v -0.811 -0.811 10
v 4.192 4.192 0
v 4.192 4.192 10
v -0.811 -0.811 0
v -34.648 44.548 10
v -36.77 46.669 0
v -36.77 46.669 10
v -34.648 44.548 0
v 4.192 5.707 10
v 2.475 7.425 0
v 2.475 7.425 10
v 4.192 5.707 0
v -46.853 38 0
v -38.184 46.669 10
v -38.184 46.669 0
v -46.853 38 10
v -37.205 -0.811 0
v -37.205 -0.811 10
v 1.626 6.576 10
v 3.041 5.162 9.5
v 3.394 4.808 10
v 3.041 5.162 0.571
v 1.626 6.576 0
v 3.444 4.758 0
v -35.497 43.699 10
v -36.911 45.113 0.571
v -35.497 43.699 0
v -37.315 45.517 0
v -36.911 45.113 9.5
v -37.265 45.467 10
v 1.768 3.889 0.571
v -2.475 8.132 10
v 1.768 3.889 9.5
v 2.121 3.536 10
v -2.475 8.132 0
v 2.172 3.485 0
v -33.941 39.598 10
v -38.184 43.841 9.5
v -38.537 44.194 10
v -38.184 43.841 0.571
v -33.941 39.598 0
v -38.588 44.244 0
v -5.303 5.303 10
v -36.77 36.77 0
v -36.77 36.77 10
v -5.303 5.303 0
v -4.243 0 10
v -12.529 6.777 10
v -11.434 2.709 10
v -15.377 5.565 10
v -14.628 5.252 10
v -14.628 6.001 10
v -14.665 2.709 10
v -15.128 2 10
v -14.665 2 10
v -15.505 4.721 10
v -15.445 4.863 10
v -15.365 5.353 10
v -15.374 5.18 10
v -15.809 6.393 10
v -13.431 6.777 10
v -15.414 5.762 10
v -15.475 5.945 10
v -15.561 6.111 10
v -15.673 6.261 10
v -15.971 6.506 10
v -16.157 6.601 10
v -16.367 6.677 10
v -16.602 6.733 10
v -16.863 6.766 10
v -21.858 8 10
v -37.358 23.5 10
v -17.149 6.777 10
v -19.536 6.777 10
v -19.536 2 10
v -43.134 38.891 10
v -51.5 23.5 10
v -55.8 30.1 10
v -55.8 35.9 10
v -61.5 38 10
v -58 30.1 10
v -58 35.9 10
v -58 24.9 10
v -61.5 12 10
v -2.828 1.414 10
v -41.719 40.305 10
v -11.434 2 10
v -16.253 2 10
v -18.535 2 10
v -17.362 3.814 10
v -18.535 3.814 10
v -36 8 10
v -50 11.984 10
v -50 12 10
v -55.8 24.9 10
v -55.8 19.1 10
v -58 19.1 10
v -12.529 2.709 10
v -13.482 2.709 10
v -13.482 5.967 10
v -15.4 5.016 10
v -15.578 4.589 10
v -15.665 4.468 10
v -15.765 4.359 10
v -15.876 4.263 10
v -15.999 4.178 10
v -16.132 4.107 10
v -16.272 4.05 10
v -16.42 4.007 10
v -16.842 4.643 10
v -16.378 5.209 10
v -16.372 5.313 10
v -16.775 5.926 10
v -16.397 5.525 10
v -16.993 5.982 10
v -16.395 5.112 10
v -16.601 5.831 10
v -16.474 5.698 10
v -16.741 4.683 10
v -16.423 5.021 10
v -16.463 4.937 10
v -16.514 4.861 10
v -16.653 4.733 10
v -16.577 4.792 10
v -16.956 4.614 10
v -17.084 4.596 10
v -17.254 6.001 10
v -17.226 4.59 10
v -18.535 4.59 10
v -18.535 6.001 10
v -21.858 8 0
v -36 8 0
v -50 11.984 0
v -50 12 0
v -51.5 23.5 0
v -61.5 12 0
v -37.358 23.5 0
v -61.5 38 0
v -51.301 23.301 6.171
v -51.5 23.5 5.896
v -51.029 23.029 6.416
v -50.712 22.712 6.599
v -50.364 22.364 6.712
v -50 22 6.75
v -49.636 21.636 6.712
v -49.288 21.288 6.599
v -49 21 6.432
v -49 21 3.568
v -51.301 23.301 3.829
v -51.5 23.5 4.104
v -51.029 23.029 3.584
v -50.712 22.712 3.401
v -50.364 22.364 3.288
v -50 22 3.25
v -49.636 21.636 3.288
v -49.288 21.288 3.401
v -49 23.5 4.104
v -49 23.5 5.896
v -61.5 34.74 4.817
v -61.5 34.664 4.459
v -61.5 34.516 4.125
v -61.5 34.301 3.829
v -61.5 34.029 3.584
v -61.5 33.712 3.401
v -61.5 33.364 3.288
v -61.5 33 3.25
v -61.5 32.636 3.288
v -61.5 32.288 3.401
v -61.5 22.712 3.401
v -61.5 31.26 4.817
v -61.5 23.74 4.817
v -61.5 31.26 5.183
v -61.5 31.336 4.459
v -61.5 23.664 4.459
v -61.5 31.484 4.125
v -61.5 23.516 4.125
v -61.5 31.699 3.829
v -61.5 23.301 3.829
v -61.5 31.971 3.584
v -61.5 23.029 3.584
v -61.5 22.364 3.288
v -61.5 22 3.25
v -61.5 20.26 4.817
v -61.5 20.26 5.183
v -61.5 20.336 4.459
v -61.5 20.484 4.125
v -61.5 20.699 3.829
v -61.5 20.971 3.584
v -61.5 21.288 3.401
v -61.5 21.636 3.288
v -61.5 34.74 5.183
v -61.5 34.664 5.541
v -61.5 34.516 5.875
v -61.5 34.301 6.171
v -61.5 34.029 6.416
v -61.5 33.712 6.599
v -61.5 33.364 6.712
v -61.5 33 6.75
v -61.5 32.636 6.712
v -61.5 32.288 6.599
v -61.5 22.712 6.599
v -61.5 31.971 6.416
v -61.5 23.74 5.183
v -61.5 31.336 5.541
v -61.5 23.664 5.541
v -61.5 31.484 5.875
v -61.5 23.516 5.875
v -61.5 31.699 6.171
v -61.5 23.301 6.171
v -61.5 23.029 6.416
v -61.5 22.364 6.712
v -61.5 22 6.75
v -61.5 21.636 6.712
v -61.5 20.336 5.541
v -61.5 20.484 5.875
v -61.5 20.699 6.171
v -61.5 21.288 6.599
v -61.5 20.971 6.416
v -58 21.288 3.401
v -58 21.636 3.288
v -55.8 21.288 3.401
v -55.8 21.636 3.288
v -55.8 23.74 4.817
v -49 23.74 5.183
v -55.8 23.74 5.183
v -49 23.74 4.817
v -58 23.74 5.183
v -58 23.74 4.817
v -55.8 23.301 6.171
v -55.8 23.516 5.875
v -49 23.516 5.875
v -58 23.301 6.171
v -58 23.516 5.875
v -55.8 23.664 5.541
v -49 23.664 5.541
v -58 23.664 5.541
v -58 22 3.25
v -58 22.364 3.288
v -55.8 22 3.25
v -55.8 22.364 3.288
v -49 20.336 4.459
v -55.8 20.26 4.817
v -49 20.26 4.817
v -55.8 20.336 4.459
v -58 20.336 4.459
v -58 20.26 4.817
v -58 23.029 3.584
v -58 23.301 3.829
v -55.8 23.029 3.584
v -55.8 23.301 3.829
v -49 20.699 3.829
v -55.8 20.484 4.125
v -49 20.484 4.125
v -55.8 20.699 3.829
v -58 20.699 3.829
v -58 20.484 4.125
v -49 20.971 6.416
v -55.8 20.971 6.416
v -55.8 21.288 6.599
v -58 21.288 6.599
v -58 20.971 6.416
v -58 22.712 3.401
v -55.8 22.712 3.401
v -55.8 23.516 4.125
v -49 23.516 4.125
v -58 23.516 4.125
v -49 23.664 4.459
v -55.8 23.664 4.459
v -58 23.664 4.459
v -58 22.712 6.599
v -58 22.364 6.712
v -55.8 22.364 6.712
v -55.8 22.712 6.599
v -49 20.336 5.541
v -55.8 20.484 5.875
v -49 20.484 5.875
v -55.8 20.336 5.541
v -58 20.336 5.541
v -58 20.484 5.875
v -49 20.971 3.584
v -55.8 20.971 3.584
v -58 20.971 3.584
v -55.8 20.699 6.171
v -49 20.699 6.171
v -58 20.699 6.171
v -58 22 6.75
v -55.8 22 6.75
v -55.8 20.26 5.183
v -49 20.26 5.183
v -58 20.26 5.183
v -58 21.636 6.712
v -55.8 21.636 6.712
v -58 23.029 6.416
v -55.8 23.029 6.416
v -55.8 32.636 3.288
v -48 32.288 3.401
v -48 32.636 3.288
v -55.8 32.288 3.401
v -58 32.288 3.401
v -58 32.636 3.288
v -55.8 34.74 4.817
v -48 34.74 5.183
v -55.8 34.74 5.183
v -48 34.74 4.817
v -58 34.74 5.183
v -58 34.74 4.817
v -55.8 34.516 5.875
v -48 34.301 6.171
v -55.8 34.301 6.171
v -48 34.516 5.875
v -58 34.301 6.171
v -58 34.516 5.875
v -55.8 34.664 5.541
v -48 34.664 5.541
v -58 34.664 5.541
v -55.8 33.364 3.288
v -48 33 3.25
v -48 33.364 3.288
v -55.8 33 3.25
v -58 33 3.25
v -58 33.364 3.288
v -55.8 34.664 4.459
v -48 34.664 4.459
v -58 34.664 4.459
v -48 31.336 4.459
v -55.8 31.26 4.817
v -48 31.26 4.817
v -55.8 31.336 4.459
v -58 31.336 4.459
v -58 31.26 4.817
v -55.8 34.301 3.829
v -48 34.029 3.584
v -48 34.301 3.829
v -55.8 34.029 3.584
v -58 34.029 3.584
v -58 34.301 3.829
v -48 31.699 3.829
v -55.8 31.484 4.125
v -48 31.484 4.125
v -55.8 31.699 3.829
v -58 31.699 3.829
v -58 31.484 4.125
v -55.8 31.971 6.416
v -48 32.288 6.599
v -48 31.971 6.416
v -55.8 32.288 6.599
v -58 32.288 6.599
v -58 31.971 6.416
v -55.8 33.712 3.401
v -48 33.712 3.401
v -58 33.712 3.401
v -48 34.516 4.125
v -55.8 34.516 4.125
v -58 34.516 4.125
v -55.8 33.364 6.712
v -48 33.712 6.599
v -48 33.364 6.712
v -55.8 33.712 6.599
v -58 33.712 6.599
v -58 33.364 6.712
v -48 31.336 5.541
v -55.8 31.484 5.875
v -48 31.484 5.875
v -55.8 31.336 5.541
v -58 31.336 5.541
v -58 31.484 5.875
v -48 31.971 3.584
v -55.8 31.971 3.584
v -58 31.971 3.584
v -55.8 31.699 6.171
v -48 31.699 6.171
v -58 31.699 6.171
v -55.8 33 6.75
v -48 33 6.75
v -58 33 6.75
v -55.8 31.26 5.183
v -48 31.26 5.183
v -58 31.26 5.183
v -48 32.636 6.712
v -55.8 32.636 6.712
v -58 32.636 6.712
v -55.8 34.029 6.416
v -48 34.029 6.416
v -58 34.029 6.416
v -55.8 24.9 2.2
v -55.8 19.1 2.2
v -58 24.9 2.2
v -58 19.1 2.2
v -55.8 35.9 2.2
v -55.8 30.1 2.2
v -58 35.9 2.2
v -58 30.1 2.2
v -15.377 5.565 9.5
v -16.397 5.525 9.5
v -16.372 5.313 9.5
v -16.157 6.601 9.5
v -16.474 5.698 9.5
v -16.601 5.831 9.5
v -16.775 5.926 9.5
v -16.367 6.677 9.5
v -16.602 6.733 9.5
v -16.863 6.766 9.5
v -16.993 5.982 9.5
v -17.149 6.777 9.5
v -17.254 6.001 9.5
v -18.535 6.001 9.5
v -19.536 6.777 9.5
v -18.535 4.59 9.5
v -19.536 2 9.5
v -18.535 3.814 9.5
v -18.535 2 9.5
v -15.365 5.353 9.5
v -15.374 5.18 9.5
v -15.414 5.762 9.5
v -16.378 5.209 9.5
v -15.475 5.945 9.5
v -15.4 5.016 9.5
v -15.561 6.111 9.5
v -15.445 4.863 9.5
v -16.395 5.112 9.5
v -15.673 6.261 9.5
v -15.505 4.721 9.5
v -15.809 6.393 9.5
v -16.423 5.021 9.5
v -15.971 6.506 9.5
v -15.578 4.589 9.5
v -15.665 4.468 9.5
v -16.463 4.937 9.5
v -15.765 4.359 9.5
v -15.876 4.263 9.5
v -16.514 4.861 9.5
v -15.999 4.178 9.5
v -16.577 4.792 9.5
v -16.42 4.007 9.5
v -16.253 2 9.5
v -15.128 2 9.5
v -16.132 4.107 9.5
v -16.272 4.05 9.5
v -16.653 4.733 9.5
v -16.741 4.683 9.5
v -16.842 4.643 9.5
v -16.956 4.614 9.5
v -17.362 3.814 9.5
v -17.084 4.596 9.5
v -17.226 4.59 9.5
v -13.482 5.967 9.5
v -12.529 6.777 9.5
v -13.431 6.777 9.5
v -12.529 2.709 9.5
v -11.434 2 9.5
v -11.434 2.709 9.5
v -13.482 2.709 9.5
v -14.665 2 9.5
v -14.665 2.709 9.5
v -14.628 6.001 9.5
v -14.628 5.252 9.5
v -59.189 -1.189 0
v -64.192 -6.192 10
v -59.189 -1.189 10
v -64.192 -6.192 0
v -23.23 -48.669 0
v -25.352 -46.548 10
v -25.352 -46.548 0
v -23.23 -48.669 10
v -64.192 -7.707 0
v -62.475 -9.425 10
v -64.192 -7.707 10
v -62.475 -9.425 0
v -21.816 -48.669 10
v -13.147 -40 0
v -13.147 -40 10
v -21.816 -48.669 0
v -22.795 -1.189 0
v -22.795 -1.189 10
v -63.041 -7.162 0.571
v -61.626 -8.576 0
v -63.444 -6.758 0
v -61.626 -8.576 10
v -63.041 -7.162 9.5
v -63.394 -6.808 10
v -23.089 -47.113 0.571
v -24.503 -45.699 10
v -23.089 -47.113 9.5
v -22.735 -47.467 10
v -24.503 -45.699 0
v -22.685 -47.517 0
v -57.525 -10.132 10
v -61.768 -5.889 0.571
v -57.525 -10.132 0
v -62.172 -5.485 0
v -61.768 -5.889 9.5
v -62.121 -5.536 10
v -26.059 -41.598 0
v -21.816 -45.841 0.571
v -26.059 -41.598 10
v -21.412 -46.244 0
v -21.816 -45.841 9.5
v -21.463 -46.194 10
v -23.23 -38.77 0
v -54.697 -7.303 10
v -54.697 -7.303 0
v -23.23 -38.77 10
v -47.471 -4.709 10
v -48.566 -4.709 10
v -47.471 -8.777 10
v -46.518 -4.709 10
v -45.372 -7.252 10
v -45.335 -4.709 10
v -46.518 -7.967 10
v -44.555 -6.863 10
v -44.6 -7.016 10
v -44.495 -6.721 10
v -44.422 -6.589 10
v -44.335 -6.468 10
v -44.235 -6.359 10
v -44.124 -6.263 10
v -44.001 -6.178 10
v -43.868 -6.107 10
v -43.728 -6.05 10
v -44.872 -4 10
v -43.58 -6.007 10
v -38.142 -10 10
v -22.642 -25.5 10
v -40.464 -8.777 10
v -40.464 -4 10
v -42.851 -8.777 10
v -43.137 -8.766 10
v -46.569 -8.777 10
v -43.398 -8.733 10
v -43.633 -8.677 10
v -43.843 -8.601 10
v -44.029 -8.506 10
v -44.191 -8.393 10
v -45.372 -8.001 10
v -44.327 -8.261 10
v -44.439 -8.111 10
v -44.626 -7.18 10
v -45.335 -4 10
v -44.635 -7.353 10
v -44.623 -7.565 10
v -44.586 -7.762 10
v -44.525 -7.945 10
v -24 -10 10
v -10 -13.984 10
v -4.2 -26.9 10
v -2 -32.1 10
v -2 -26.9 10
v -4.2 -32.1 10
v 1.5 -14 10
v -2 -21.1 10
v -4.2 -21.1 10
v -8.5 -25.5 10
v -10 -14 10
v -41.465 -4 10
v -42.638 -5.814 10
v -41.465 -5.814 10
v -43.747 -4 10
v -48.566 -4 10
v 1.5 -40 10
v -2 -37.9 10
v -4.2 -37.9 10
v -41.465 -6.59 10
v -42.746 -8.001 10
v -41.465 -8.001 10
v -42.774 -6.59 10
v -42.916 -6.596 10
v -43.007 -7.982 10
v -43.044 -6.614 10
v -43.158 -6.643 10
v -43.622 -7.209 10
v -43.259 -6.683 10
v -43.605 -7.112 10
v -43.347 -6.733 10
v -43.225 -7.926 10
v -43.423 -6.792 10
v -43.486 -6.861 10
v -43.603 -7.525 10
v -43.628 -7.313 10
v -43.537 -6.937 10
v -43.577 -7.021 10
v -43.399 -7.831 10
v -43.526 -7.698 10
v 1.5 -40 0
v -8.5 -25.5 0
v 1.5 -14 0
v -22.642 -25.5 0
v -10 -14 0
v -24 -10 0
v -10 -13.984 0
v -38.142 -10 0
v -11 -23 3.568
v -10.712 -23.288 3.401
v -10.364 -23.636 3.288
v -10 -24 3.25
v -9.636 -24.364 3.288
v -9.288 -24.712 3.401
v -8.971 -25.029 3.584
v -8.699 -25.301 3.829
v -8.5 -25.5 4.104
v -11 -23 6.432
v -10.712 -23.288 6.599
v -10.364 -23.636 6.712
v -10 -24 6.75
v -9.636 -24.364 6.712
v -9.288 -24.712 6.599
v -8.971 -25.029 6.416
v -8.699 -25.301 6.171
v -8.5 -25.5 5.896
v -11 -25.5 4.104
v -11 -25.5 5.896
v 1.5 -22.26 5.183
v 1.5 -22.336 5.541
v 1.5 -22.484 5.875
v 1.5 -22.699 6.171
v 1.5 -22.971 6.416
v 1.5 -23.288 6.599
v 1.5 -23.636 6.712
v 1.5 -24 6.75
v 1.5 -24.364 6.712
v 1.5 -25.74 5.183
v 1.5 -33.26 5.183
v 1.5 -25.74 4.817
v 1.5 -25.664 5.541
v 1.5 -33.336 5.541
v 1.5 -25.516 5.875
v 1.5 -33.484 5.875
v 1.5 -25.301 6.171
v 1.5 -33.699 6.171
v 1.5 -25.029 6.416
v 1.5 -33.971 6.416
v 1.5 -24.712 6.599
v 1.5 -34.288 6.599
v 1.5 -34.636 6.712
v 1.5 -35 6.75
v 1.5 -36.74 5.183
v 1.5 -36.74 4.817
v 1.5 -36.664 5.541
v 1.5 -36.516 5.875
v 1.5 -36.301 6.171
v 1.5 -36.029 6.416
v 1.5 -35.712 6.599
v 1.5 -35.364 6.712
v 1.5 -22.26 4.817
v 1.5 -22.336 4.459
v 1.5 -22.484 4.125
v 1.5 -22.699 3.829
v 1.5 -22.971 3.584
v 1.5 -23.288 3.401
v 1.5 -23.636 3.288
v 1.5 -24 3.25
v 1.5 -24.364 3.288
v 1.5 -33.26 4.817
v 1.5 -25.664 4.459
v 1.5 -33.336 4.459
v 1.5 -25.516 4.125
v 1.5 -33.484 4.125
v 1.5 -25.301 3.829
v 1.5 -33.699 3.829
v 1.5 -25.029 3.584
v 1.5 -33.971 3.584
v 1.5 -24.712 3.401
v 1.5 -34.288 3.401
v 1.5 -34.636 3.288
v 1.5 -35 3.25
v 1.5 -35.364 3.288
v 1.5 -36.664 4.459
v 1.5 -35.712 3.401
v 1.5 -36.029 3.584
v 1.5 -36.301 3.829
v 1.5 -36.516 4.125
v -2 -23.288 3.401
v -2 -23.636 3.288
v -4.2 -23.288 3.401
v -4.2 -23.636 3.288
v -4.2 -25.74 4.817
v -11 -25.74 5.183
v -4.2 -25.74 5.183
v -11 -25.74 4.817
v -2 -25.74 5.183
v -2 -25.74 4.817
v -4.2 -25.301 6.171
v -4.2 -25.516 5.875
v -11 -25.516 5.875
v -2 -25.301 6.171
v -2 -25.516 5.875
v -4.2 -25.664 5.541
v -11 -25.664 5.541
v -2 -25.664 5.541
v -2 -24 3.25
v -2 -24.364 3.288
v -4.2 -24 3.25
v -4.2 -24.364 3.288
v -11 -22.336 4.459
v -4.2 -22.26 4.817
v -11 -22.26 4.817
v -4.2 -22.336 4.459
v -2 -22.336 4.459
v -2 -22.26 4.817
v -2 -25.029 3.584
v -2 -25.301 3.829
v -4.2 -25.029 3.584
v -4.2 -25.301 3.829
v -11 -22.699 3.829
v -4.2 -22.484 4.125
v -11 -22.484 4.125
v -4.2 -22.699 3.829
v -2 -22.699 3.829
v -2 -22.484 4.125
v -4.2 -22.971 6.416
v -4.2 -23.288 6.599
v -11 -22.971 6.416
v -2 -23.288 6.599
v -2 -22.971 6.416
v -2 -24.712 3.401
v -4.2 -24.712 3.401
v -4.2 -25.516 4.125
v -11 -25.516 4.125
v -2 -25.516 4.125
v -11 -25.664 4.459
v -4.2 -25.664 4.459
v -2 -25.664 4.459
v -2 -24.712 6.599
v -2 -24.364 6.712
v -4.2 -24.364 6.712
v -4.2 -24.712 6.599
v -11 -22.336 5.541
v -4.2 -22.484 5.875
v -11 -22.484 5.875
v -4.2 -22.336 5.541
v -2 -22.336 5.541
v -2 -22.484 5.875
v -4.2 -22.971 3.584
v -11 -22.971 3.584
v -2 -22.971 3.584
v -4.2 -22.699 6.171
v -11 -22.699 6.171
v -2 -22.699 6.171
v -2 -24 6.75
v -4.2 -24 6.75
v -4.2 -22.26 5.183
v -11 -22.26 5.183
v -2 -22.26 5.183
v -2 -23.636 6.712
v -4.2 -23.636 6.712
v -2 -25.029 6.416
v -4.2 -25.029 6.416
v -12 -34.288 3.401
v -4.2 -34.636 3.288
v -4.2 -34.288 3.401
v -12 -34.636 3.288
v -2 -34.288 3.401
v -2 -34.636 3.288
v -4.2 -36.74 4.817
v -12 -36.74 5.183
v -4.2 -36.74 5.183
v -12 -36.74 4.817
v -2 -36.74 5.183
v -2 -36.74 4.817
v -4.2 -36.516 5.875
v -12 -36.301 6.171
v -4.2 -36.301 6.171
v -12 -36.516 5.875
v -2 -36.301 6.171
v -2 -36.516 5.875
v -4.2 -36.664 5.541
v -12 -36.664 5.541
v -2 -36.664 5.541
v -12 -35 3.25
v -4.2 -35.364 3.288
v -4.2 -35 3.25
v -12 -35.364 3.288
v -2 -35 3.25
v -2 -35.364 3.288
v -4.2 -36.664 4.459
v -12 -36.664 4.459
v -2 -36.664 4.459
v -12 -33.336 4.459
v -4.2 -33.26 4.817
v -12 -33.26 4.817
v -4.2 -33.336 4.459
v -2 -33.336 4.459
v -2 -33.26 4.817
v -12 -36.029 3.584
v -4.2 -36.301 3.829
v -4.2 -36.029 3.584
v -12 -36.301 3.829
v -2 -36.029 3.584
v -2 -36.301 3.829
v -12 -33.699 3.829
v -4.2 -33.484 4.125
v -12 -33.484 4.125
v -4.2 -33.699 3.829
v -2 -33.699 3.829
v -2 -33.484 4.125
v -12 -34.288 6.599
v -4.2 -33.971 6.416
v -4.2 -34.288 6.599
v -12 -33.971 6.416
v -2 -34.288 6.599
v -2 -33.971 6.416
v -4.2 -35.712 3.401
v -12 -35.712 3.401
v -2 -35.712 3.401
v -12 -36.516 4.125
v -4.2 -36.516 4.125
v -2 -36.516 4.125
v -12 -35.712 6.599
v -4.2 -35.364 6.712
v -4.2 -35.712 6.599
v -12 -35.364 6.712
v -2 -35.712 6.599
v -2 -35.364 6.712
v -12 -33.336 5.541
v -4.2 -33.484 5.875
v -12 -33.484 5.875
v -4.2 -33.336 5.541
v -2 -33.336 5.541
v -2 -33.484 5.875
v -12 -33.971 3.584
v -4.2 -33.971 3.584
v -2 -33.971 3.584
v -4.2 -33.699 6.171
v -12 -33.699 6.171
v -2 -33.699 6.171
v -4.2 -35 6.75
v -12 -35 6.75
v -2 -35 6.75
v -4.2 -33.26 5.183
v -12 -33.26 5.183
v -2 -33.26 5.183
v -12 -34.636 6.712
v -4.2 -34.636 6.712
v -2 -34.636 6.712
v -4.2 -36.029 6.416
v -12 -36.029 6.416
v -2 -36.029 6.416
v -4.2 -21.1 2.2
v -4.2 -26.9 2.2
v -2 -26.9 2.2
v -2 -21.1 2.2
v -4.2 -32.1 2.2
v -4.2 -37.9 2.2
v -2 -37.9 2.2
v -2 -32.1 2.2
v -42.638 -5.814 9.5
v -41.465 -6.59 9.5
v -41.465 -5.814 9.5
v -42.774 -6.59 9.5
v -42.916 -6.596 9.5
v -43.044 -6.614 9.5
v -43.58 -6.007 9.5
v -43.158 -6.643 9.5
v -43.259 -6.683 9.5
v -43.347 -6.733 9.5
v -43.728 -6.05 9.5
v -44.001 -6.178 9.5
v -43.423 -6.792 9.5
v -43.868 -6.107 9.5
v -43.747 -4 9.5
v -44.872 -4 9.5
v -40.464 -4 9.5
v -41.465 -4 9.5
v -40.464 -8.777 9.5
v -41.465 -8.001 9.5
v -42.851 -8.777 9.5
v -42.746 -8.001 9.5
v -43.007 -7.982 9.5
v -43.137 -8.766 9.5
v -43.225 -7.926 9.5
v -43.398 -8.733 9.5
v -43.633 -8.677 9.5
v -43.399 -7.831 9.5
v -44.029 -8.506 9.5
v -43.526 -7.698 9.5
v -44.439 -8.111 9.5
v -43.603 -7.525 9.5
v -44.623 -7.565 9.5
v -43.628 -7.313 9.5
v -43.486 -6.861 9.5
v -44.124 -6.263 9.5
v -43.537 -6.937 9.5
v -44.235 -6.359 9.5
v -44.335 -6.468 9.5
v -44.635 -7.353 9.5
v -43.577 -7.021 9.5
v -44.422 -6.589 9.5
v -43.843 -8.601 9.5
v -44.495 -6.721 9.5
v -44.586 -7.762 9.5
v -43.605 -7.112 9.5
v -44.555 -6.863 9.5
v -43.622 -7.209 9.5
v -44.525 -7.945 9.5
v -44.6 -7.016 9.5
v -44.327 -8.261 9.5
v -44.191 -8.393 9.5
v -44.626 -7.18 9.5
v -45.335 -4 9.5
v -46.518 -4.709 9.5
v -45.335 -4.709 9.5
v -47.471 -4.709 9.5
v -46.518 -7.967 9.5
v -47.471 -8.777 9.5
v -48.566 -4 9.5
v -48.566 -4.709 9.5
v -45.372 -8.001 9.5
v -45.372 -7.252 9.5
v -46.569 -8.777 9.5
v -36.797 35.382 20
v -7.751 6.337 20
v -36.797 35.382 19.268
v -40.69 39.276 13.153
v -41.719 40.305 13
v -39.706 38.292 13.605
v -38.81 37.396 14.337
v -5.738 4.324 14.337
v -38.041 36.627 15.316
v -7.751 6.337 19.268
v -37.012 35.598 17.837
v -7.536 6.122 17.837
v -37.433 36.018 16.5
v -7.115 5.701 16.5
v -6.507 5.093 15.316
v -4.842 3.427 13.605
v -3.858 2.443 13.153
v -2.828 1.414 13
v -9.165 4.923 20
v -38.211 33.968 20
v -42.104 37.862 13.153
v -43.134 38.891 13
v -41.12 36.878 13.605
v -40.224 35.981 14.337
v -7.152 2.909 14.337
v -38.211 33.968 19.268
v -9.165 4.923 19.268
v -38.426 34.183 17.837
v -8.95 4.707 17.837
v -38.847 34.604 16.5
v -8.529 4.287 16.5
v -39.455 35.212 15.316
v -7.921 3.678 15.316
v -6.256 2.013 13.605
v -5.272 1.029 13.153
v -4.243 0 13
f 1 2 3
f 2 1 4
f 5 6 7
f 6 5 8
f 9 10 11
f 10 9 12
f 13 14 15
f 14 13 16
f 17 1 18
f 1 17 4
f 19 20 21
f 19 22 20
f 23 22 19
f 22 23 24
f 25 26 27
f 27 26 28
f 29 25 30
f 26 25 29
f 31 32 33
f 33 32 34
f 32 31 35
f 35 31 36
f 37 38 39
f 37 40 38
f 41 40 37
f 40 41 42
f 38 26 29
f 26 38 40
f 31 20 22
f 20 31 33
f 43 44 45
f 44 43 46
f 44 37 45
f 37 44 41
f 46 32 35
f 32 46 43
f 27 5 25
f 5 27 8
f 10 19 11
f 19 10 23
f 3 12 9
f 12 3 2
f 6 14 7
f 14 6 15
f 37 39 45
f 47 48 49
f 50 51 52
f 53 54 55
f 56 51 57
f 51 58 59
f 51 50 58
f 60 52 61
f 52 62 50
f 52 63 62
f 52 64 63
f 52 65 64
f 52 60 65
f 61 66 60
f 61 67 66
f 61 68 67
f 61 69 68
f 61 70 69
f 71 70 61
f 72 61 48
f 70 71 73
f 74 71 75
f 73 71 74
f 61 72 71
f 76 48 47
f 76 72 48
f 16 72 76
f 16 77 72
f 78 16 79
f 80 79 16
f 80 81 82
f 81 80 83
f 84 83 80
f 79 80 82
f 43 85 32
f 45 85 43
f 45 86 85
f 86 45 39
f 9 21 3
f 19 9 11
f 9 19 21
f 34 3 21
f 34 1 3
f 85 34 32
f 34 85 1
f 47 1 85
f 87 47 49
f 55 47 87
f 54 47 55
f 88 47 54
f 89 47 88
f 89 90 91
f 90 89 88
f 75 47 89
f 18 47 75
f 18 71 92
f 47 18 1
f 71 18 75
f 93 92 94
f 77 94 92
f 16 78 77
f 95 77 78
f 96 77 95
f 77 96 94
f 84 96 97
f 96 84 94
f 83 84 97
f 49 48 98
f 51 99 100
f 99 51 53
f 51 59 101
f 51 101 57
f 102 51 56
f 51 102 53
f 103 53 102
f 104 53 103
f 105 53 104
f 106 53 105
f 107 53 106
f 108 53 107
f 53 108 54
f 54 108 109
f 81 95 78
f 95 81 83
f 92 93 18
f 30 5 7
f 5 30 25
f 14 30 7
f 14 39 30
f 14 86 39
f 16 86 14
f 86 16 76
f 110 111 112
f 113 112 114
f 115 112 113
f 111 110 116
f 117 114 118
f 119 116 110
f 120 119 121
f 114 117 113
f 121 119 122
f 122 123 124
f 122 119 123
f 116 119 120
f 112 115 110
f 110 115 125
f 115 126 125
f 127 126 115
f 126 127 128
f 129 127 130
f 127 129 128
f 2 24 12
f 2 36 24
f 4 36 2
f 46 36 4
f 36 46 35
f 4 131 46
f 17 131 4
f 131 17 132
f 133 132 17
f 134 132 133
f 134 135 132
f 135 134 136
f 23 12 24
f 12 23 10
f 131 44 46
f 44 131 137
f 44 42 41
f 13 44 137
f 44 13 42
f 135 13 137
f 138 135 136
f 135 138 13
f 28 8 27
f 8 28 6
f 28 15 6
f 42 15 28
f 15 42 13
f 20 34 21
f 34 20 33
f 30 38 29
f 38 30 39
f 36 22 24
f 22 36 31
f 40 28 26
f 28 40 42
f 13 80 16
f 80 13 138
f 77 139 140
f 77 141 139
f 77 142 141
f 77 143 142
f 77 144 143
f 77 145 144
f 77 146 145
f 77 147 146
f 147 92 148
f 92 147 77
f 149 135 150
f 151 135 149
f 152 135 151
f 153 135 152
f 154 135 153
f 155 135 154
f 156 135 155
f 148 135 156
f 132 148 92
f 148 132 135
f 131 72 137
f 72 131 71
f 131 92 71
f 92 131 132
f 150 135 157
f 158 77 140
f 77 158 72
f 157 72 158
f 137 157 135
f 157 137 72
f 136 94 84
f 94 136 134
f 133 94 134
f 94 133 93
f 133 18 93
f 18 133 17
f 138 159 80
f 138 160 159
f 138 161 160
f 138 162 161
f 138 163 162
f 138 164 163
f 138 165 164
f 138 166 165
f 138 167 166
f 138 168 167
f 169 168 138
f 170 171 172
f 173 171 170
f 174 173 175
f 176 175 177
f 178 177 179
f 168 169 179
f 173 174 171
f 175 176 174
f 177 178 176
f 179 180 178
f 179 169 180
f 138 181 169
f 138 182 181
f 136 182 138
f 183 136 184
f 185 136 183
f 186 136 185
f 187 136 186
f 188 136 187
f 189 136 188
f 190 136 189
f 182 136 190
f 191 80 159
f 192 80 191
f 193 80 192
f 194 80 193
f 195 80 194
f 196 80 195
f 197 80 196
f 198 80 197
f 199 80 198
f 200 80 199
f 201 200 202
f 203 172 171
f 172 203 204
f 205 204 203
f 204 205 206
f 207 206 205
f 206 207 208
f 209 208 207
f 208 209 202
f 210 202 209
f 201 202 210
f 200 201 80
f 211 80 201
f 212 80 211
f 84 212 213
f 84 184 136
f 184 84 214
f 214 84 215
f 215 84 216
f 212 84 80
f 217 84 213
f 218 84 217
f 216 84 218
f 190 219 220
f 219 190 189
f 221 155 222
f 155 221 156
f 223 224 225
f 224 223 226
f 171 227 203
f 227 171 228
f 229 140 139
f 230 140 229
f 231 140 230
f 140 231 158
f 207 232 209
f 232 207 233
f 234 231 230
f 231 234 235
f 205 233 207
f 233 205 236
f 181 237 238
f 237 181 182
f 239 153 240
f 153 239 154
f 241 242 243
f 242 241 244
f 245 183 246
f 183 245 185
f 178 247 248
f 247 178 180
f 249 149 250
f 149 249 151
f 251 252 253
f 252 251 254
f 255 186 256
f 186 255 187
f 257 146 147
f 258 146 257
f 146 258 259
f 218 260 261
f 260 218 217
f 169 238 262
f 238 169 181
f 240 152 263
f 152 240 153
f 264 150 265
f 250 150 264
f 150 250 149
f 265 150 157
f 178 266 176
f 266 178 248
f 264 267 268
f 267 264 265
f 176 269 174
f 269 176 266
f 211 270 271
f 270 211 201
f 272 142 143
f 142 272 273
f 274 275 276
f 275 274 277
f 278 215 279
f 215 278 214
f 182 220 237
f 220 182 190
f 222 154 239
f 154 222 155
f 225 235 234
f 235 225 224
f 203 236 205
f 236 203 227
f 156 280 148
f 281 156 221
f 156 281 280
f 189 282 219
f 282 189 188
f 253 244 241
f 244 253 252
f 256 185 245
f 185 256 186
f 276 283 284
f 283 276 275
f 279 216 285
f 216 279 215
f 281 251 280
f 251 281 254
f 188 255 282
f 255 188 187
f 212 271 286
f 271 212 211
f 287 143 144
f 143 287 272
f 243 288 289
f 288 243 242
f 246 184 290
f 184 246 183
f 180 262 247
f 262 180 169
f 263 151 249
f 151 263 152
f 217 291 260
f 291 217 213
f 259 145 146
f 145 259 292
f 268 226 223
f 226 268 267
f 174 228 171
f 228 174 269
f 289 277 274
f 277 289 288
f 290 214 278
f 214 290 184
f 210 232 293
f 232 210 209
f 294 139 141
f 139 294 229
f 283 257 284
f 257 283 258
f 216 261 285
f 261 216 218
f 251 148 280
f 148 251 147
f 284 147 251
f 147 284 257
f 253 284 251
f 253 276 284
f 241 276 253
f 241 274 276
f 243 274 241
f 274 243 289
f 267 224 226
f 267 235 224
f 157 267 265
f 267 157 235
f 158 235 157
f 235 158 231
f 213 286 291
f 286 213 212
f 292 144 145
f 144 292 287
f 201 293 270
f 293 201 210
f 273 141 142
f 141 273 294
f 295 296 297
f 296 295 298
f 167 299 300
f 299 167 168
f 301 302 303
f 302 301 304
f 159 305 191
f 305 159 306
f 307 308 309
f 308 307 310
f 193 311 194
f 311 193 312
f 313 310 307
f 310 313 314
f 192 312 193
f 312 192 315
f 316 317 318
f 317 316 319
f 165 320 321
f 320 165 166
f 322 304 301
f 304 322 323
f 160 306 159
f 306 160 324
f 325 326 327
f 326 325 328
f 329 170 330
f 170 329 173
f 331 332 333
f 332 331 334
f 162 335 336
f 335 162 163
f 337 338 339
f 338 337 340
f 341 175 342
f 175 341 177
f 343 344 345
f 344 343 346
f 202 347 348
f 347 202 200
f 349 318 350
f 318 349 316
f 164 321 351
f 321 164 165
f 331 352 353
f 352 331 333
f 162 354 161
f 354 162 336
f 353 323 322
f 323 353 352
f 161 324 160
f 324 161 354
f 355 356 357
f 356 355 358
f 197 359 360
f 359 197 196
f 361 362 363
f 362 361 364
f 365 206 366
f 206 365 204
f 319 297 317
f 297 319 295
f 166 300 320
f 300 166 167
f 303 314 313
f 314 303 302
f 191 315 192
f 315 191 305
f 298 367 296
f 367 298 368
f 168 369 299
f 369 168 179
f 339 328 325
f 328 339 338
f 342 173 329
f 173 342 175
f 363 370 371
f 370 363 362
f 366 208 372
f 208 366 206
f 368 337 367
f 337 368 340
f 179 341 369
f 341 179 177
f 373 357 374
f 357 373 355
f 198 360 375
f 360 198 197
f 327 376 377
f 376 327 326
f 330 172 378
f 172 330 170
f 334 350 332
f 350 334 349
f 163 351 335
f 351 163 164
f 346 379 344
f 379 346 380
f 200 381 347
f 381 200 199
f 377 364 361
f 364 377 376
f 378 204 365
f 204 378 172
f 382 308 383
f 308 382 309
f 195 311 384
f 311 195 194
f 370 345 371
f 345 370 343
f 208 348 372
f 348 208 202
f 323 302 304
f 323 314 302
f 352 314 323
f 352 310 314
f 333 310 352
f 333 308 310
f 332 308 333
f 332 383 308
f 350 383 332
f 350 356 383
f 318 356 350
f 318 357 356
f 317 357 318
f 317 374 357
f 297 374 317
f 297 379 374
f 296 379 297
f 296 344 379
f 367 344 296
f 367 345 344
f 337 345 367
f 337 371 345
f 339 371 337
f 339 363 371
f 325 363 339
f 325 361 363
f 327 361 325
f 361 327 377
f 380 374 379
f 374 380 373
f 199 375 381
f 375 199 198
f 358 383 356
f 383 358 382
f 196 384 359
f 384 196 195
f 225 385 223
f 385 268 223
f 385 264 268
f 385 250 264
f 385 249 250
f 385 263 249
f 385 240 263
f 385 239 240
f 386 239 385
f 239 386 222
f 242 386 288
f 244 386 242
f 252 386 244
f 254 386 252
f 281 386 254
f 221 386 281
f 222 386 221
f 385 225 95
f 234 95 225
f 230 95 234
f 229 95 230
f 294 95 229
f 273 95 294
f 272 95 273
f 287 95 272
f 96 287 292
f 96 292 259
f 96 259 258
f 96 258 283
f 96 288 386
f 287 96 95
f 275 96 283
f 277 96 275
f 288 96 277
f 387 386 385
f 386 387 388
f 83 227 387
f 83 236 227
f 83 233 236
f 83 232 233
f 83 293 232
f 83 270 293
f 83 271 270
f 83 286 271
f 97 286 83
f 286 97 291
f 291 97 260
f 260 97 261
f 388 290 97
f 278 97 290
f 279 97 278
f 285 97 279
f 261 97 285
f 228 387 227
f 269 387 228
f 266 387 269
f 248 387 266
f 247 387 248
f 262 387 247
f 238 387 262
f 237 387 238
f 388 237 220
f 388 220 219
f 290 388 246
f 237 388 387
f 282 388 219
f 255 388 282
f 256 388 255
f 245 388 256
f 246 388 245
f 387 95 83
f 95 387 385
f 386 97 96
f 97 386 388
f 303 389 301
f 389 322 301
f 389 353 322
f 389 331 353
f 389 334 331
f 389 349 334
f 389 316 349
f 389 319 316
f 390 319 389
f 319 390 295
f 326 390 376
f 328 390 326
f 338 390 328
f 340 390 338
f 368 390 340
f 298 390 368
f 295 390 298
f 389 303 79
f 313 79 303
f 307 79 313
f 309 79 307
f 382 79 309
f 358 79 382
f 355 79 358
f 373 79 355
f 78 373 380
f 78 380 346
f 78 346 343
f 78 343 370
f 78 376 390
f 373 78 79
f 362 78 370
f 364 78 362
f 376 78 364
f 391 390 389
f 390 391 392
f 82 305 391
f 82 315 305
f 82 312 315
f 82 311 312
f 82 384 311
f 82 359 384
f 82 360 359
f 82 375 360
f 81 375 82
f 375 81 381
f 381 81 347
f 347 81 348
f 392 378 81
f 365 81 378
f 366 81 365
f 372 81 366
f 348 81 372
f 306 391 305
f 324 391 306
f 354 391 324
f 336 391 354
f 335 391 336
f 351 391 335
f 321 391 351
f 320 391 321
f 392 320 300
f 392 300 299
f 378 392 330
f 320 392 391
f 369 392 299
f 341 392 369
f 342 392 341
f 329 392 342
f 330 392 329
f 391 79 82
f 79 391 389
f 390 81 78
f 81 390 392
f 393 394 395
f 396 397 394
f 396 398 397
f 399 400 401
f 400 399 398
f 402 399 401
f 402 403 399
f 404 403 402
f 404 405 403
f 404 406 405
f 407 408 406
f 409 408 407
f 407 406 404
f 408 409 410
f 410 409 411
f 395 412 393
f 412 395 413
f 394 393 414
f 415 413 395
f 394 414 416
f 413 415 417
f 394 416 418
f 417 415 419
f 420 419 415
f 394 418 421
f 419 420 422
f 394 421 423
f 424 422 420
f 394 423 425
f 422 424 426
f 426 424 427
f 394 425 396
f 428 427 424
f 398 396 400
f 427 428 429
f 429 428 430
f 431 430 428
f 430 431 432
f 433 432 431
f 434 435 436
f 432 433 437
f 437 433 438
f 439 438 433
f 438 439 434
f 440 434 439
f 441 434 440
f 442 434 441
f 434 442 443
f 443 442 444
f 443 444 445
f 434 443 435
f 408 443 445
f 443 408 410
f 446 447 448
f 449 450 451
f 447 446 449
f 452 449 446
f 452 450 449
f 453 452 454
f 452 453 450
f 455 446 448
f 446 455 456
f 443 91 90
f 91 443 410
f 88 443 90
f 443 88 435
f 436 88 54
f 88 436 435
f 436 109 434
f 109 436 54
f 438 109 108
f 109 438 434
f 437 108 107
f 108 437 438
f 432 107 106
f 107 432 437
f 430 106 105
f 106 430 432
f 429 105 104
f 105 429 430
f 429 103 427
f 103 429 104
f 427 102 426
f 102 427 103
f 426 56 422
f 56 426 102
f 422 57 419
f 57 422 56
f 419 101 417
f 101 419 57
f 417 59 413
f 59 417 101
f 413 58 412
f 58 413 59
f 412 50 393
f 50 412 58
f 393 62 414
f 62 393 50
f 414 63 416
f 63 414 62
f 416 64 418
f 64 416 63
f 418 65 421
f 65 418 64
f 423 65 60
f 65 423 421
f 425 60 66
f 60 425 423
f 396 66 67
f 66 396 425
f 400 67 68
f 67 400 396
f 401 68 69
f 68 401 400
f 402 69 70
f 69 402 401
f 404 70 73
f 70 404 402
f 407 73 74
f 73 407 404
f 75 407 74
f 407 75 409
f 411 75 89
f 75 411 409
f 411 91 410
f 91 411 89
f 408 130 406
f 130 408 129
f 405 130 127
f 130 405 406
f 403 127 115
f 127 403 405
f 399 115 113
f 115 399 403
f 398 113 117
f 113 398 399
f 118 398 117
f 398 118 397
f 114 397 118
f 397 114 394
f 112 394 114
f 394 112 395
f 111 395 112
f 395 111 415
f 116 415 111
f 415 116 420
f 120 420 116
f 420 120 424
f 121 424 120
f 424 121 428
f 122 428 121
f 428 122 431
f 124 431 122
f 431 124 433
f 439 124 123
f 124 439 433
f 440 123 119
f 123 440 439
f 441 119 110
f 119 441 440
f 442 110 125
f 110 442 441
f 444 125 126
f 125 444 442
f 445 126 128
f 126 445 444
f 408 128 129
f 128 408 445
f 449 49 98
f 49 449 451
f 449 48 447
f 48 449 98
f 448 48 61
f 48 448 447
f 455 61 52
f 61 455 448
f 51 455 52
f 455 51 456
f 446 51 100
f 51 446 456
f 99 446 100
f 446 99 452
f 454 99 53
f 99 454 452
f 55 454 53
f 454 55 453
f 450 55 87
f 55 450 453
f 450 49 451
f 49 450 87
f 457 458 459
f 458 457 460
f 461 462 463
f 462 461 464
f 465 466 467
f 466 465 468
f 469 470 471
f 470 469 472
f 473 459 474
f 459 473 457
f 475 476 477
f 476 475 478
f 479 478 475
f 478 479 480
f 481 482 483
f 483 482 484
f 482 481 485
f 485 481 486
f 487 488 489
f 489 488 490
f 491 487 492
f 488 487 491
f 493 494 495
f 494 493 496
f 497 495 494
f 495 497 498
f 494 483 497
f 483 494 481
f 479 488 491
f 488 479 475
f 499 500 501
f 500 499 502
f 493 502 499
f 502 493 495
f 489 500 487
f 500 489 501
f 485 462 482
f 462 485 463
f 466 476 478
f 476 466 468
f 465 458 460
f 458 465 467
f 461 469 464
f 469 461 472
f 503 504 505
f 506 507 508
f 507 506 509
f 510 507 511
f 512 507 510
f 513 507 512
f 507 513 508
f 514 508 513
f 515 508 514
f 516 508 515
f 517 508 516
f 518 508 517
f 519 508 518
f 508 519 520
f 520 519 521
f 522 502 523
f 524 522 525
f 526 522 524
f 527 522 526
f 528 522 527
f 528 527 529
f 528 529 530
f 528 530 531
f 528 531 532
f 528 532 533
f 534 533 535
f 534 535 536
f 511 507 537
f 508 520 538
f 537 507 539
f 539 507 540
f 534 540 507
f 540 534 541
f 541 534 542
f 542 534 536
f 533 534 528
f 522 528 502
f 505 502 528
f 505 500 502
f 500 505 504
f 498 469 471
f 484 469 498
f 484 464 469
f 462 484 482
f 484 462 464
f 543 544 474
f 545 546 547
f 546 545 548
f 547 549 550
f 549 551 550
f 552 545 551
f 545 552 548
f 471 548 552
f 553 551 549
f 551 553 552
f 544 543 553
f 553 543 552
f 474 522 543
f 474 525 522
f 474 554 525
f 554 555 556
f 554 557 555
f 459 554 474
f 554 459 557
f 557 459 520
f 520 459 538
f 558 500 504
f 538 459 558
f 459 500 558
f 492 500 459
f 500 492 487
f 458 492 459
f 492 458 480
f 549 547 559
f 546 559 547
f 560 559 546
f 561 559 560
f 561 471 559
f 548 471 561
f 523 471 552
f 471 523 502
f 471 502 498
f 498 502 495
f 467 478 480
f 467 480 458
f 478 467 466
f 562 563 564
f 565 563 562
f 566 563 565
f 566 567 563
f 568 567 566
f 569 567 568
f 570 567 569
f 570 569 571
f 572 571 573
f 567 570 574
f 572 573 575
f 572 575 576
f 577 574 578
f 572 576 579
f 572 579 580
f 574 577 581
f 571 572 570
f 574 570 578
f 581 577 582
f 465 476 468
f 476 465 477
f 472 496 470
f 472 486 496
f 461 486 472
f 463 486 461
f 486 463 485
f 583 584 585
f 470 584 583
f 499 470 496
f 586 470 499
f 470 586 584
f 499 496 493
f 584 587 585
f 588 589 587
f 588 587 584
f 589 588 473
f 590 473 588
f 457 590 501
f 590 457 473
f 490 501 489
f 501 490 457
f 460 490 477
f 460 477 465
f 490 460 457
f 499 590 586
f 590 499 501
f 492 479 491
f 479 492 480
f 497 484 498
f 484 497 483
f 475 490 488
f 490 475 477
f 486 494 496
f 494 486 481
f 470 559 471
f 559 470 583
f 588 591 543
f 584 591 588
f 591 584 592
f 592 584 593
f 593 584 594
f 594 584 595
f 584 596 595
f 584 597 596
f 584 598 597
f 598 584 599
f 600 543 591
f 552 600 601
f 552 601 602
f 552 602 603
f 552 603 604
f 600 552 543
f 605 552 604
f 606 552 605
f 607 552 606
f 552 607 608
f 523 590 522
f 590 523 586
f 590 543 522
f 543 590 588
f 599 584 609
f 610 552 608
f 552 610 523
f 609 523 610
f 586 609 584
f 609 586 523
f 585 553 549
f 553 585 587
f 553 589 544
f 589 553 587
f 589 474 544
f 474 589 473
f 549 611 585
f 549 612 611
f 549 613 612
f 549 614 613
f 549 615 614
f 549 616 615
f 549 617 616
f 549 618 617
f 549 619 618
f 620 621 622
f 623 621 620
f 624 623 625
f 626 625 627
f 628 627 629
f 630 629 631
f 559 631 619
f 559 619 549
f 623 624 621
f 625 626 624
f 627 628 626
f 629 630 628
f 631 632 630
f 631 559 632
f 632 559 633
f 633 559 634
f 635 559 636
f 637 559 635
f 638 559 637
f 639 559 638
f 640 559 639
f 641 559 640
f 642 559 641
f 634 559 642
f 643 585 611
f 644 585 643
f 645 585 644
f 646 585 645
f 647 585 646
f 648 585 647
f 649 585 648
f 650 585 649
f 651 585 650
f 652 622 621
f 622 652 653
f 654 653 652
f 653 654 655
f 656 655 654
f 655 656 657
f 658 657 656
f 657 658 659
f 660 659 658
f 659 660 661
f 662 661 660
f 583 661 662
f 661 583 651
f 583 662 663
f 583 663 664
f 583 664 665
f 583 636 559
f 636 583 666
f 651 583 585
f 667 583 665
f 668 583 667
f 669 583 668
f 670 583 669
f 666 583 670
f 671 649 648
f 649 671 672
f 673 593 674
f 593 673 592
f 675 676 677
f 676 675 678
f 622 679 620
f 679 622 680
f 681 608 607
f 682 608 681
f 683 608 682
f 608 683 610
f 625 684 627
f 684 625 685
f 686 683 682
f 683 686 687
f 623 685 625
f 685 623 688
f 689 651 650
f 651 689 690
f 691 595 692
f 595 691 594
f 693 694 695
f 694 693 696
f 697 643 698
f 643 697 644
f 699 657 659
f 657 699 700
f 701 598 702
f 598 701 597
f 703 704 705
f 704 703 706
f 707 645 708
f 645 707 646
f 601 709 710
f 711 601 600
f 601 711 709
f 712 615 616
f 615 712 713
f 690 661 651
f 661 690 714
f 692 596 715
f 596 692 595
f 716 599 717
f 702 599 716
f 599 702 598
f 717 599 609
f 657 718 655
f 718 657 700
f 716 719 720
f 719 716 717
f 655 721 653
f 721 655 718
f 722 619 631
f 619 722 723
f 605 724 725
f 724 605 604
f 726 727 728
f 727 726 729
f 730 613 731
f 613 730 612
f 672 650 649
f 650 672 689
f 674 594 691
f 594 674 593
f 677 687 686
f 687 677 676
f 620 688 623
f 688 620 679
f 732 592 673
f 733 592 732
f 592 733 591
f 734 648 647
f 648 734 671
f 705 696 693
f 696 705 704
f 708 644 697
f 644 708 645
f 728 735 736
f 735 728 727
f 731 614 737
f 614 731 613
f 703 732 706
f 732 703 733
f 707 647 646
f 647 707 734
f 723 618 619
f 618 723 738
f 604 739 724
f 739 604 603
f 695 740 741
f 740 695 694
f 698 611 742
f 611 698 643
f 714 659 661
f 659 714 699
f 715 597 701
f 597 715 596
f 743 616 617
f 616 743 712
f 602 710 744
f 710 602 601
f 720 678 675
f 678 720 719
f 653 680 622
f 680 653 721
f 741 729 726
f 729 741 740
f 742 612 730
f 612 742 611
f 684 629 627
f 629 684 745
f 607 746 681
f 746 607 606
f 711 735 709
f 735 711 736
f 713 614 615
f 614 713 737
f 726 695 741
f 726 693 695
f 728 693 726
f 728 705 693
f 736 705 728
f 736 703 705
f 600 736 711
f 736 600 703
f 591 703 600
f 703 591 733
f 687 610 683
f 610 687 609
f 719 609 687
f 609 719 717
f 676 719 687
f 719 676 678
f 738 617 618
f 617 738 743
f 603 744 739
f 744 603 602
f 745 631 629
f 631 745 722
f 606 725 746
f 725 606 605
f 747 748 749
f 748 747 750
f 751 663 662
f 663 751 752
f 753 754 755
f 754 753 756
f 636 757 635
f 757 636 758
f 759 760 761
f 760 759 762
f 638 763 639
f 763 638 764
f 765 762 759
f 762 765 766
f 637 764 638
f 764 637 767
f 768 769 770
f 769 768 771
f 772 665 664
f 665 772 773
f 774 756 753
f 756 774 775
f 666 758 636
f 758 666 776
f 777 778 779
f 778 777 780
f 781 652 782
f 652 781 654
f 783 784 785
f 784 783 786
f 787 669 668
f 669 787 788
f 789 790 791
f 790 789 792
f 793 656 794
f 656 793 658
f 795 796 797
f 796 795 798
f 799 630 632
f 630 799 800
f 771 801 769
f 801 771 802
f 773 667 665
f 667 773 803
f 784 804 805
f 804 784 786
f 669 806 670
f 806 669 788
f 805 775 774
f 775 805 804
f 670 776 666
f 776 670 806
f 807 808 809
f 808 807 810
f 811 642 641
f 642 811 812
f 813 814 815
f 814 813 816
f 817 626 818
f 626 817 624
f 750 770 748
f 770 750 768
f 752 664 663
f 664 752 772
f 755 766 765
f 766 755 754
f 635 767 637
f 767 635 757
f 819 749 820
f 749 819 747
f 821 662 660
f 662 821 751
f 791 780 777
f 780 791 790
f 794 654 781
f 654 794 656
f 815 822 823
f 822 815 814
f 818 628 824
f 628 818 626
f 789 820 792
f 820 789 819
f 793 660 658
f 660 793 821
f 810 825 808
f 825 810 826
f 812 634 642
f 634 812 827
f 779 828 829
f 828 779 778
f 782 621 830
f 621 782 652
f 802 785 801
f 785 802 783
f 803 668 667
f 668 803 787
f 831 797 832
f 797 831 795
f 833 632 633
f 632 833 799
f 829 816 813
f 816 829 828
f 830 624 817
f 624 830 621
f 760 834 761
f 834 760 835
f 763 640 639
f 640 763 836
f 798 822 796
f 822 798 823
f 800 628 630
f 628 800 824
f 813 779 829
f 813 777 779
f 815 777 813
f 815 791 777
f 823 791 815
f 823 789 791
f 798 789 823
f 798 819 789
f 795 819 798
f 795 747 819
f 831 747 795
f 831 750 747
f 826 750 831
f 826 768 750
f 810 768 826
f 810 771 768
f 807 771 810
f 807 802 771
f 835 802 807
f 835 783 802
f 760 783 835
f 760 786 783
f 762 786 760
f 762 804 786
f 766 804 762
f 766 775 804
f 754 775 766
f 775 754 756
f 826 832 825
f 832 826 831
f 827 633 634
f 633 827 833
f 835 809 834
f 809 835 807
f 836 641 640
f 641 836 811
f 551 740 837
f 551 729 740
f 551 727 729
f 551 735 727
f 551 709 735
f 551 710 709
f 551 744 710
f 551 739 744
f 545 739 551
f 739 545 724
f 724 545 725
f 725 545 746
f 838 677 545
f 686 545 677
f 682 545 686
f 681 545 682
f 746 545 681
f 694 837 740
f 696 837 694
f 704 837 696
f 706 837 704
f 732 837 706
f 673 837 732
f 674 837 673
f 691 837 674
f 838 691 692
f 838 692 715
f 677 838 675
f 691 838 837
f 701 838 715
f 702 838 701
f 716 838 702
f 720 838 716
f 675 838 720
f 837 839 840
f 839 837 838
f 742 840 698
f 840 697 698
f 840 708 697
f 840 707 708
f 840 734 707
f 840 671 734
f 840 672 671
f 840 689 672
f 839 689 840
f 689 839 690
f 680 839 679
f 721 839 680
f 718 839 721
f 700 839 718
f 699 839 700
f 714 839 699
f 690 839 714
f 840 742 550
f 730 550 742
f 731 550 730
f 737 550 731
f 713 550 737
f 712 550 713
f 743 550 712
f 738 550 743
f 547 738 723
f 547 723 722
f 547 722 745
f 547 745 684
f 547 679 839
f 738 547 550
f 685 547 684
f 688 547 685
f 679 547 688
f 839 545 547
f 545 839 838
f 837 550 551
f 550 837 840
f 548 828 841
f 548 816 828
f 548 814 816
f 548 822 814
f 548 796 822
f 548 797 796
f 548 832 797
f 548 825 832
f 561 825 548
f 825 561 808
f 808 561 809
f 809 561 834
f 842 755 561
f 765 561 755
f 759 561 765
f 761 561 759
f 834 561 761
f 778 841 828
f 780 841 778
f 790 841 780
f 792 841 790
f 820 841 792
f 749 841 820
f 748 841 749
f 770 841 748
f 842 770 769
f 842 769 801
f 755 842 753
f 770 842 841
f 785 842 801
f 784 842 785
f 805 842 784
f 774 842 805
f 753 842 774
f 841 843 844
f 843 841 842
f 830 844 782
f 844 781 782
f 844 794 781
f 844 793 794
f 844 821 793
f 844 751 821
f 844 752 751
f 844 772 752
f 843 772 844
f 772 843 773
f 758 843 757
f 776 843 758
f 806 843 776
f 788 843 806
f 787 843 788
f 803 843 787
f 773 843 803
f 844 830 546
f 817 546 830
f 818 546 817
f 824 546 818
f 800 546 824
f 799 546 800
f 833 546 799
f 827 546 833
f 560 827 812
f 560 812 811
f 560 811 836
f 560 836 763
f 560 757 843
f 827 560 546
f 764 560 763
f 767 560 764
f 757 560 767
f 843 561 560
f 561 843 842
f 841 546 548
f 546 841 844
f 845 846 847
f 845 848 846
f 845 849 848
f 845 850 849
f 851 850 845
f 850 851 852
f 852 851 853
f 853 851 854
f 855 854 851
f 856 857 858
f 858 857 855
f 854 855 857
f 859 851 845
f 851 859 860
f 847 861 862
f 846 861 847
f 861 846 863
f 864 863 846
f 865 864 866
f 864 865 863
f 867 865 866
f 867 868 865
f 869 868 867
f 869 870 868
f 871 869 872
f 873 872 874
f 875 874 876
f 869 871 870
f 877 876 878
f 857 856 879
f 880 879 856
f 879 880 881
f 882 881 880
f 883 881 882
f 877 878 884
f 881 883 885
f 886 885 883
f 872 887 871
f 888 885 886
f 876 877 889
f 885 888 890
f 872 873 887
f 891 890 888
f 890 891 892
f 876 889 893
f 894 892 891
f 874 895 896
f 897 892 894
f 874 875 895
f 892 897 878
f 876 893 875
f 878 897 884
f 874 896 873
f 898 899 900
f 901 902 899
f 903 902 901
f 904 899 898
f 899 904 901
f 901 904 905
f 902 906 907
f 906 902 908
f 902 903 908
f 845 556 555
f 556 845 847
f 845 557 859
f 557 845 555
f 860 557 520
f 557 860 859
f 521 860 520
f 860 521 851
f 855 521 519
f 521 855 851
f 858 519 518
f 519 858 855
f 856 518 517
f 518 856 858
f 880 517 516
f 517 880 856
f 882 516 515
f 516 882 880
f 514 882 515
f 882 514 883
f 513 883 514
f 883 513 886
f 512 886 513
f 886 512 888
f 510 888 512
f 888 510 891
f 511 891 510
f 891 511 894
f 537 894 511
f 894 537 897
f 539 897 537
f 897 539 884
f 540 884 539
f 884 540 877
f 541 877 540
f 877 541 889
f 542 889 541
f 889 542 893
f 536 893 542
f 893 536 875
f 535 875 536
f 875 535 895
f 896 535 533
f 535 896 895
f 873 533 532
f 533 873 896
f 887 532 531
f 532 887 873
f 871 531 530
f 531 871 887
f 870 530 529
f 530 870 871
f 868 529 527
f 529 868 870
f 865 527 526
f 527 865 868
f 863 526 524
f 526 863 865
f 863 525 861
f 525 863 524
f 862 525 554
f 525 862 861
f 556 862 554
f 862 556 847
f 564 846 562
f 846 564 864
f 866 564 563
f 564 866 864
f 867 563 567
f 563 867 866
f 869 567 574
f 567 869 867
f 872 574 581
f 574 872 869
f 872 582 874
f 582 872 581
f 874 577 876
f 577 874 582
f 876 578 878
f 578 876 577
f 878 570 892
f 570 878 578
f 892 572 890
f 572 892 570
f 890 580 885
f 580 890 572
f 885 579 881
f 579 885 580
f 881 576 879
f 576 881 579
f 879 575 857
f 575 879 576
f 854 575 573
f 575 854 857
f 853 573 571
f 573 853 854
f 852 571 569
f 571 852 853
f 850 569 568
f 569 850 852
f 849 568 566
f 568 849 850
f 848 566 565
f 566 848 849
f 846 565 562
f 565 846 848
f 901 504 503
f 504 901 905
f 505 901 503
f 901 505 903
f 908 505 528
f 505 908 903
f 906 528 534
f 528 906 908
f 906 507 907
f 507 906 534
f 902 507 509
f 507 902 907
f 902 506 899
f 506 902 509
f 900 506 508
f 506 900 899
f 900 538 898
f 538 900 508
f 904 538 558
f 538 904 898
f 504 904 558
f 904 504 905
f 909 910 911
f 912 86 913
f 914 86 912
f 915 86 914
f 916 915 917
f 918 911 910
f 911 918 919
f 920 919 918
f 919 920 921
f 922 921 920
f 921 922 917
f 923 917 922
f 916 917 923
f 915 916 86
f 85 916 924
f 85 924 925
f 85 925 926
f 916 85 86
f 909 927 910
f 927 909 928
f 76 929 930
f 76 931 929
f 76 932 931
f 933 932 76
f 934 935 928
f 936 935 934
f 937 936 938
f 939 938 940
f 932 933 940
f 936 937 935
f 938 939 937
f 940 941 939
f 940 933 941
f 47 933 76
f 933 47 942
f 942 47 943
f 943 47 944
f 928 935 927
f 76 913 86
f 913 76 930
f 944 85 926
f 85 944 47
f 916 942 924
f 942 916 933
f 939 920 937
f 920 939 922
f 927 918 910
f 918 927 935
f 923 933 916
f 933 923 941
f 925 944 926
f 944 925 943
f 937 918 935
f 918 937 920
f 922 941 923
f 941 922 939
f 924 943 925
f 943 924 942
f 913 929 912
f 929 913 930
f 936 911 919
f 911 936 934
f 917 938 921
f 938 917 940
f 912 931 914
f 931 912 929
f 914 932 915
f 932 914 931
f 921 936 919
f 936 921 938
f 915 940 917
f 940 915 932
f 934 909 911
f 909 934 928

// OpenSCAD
// PIRANHA iteration1
// LCD cover
// GNU GPL v3
// Usan Siriwardana <usiriwar@uwaterloo.ca> and contributors
// based on Prusa i3 MK3S
// https://reprap.org/wiki/Prusa_i3_MK3

module body()
{

    difference() 
        {
        // base block
        translate([-55,-2,0]) cube([69,81,10]); 

            union ()
            {
                // outer body shape
                translate([-69.6,32,-1]) rotate([0,0,45]) cube([60,53,15]); 
                translate([13.7,89.7,-1]) rotate([0,0,135]) cube([60,42,15]);
                translate([-19,-9,-1]) cube([60,9,15] );   
                translate([7,-3,-1]) cube([60,68,16]);  
                translate([-16,60,-1]) cube([60,50,15] );
                translate([-41, -45,-1]) rotate([0,0,45]) cube([60,80,13]);  
                
                // pcb cout out
                translate([4,1.5,-1]) cube([1.8,56.5,17]); 
                translate([0,7.5,-1]) cube([5.8,44.5,17]); 
                translate([4.8,3.5,-1]) cube([5.8,52.5,17]);
                translate([8,-5,-1] ) rotate([0,0,45]) cube([5,5,17]);
                translate([8,58,-1]) rotate([0,0,45]) cube([5,5,17]);
            }

            // pcb inserts
            translate([4,3,8]) rotate([45,0,0]) cube([1.8,5,5]); 
            translate([4,56.5,8]) rotate([45,0,0]) cube([1.8,5,5]);     
            translate([4,3,-5]) rotate([45,0,0]) cube([1.8,5,5]); 
            translate([4,56.5,-5]) rotate([45,0,0]) cube([1.8,5,5]);     
        }
}



module support()
{
    difference() 
    {
    
        union()
        {
            rotate([0,0,45]) body();
            // screw block
            translate([-72,22,0])  cube([30,16,10]);    
        }
        
        // lower angled part cut
        translate([-75,-2,-1])  cube([20,14,15]);    
        translate([-70,-2,-1]) cube([20,14,15]);    
        translate([-50,-16.3,-1]) rotate([0,0,45]) cube([20,20,15]);    
        
        translate([-76.5,-2,-1]) cube([15,40,15]);    
        
        difference()
        {
            translate([-28,0,-1]) rotate([0,0,45]) cube([10,40,15]);    
            translate([-38,-12,-1]) cube([20,20,15]);    
            translate([-58,23.5,-1]) cube([25,25,15]);    
        }
        
        // screw holes
        translate([-71,18+4,5]) rotate([0,90,0]) cylinder(h=22, r=1.75, $fn=30);  
        translate([-70,29+4,5]) rotate([0,90,0]) cylinder(h=22, r=1.75, $fn=30);  
        
        // nut traps
        translate([-58,15.1+4,5-2.8]) cube([2.2,5.8,29.7]);    
        translate([-58,26.1+4,5-2.8]) cube([2.2,5.8,29.7]); 
     
        // version
        translate([-20,2,9.5]) rotate([0,0,0]) linear_extrude(height = 0.6) 
        { text("R1",font = "helvetica:style=Bold", size=5); }   
    }
}


module left_lcd_support()
{
    support();
     
    rotate([0,0,45]) difference()
    {
        // sd card shield
        translate([-3,3,10])  cube([2,55,10]); 
        translate([-4,3,20]) rotate([0,90,0]) cylinder( h=4, r=7, $fn=30); 
        translate([-4,58,20]) rotate([0,90,0]) cylinder( h=4, r=7, $fn=30); 
    }
}

translate([-60,-2,0]) rotate([0,0,180]) support();
left_lcd_support();

 
